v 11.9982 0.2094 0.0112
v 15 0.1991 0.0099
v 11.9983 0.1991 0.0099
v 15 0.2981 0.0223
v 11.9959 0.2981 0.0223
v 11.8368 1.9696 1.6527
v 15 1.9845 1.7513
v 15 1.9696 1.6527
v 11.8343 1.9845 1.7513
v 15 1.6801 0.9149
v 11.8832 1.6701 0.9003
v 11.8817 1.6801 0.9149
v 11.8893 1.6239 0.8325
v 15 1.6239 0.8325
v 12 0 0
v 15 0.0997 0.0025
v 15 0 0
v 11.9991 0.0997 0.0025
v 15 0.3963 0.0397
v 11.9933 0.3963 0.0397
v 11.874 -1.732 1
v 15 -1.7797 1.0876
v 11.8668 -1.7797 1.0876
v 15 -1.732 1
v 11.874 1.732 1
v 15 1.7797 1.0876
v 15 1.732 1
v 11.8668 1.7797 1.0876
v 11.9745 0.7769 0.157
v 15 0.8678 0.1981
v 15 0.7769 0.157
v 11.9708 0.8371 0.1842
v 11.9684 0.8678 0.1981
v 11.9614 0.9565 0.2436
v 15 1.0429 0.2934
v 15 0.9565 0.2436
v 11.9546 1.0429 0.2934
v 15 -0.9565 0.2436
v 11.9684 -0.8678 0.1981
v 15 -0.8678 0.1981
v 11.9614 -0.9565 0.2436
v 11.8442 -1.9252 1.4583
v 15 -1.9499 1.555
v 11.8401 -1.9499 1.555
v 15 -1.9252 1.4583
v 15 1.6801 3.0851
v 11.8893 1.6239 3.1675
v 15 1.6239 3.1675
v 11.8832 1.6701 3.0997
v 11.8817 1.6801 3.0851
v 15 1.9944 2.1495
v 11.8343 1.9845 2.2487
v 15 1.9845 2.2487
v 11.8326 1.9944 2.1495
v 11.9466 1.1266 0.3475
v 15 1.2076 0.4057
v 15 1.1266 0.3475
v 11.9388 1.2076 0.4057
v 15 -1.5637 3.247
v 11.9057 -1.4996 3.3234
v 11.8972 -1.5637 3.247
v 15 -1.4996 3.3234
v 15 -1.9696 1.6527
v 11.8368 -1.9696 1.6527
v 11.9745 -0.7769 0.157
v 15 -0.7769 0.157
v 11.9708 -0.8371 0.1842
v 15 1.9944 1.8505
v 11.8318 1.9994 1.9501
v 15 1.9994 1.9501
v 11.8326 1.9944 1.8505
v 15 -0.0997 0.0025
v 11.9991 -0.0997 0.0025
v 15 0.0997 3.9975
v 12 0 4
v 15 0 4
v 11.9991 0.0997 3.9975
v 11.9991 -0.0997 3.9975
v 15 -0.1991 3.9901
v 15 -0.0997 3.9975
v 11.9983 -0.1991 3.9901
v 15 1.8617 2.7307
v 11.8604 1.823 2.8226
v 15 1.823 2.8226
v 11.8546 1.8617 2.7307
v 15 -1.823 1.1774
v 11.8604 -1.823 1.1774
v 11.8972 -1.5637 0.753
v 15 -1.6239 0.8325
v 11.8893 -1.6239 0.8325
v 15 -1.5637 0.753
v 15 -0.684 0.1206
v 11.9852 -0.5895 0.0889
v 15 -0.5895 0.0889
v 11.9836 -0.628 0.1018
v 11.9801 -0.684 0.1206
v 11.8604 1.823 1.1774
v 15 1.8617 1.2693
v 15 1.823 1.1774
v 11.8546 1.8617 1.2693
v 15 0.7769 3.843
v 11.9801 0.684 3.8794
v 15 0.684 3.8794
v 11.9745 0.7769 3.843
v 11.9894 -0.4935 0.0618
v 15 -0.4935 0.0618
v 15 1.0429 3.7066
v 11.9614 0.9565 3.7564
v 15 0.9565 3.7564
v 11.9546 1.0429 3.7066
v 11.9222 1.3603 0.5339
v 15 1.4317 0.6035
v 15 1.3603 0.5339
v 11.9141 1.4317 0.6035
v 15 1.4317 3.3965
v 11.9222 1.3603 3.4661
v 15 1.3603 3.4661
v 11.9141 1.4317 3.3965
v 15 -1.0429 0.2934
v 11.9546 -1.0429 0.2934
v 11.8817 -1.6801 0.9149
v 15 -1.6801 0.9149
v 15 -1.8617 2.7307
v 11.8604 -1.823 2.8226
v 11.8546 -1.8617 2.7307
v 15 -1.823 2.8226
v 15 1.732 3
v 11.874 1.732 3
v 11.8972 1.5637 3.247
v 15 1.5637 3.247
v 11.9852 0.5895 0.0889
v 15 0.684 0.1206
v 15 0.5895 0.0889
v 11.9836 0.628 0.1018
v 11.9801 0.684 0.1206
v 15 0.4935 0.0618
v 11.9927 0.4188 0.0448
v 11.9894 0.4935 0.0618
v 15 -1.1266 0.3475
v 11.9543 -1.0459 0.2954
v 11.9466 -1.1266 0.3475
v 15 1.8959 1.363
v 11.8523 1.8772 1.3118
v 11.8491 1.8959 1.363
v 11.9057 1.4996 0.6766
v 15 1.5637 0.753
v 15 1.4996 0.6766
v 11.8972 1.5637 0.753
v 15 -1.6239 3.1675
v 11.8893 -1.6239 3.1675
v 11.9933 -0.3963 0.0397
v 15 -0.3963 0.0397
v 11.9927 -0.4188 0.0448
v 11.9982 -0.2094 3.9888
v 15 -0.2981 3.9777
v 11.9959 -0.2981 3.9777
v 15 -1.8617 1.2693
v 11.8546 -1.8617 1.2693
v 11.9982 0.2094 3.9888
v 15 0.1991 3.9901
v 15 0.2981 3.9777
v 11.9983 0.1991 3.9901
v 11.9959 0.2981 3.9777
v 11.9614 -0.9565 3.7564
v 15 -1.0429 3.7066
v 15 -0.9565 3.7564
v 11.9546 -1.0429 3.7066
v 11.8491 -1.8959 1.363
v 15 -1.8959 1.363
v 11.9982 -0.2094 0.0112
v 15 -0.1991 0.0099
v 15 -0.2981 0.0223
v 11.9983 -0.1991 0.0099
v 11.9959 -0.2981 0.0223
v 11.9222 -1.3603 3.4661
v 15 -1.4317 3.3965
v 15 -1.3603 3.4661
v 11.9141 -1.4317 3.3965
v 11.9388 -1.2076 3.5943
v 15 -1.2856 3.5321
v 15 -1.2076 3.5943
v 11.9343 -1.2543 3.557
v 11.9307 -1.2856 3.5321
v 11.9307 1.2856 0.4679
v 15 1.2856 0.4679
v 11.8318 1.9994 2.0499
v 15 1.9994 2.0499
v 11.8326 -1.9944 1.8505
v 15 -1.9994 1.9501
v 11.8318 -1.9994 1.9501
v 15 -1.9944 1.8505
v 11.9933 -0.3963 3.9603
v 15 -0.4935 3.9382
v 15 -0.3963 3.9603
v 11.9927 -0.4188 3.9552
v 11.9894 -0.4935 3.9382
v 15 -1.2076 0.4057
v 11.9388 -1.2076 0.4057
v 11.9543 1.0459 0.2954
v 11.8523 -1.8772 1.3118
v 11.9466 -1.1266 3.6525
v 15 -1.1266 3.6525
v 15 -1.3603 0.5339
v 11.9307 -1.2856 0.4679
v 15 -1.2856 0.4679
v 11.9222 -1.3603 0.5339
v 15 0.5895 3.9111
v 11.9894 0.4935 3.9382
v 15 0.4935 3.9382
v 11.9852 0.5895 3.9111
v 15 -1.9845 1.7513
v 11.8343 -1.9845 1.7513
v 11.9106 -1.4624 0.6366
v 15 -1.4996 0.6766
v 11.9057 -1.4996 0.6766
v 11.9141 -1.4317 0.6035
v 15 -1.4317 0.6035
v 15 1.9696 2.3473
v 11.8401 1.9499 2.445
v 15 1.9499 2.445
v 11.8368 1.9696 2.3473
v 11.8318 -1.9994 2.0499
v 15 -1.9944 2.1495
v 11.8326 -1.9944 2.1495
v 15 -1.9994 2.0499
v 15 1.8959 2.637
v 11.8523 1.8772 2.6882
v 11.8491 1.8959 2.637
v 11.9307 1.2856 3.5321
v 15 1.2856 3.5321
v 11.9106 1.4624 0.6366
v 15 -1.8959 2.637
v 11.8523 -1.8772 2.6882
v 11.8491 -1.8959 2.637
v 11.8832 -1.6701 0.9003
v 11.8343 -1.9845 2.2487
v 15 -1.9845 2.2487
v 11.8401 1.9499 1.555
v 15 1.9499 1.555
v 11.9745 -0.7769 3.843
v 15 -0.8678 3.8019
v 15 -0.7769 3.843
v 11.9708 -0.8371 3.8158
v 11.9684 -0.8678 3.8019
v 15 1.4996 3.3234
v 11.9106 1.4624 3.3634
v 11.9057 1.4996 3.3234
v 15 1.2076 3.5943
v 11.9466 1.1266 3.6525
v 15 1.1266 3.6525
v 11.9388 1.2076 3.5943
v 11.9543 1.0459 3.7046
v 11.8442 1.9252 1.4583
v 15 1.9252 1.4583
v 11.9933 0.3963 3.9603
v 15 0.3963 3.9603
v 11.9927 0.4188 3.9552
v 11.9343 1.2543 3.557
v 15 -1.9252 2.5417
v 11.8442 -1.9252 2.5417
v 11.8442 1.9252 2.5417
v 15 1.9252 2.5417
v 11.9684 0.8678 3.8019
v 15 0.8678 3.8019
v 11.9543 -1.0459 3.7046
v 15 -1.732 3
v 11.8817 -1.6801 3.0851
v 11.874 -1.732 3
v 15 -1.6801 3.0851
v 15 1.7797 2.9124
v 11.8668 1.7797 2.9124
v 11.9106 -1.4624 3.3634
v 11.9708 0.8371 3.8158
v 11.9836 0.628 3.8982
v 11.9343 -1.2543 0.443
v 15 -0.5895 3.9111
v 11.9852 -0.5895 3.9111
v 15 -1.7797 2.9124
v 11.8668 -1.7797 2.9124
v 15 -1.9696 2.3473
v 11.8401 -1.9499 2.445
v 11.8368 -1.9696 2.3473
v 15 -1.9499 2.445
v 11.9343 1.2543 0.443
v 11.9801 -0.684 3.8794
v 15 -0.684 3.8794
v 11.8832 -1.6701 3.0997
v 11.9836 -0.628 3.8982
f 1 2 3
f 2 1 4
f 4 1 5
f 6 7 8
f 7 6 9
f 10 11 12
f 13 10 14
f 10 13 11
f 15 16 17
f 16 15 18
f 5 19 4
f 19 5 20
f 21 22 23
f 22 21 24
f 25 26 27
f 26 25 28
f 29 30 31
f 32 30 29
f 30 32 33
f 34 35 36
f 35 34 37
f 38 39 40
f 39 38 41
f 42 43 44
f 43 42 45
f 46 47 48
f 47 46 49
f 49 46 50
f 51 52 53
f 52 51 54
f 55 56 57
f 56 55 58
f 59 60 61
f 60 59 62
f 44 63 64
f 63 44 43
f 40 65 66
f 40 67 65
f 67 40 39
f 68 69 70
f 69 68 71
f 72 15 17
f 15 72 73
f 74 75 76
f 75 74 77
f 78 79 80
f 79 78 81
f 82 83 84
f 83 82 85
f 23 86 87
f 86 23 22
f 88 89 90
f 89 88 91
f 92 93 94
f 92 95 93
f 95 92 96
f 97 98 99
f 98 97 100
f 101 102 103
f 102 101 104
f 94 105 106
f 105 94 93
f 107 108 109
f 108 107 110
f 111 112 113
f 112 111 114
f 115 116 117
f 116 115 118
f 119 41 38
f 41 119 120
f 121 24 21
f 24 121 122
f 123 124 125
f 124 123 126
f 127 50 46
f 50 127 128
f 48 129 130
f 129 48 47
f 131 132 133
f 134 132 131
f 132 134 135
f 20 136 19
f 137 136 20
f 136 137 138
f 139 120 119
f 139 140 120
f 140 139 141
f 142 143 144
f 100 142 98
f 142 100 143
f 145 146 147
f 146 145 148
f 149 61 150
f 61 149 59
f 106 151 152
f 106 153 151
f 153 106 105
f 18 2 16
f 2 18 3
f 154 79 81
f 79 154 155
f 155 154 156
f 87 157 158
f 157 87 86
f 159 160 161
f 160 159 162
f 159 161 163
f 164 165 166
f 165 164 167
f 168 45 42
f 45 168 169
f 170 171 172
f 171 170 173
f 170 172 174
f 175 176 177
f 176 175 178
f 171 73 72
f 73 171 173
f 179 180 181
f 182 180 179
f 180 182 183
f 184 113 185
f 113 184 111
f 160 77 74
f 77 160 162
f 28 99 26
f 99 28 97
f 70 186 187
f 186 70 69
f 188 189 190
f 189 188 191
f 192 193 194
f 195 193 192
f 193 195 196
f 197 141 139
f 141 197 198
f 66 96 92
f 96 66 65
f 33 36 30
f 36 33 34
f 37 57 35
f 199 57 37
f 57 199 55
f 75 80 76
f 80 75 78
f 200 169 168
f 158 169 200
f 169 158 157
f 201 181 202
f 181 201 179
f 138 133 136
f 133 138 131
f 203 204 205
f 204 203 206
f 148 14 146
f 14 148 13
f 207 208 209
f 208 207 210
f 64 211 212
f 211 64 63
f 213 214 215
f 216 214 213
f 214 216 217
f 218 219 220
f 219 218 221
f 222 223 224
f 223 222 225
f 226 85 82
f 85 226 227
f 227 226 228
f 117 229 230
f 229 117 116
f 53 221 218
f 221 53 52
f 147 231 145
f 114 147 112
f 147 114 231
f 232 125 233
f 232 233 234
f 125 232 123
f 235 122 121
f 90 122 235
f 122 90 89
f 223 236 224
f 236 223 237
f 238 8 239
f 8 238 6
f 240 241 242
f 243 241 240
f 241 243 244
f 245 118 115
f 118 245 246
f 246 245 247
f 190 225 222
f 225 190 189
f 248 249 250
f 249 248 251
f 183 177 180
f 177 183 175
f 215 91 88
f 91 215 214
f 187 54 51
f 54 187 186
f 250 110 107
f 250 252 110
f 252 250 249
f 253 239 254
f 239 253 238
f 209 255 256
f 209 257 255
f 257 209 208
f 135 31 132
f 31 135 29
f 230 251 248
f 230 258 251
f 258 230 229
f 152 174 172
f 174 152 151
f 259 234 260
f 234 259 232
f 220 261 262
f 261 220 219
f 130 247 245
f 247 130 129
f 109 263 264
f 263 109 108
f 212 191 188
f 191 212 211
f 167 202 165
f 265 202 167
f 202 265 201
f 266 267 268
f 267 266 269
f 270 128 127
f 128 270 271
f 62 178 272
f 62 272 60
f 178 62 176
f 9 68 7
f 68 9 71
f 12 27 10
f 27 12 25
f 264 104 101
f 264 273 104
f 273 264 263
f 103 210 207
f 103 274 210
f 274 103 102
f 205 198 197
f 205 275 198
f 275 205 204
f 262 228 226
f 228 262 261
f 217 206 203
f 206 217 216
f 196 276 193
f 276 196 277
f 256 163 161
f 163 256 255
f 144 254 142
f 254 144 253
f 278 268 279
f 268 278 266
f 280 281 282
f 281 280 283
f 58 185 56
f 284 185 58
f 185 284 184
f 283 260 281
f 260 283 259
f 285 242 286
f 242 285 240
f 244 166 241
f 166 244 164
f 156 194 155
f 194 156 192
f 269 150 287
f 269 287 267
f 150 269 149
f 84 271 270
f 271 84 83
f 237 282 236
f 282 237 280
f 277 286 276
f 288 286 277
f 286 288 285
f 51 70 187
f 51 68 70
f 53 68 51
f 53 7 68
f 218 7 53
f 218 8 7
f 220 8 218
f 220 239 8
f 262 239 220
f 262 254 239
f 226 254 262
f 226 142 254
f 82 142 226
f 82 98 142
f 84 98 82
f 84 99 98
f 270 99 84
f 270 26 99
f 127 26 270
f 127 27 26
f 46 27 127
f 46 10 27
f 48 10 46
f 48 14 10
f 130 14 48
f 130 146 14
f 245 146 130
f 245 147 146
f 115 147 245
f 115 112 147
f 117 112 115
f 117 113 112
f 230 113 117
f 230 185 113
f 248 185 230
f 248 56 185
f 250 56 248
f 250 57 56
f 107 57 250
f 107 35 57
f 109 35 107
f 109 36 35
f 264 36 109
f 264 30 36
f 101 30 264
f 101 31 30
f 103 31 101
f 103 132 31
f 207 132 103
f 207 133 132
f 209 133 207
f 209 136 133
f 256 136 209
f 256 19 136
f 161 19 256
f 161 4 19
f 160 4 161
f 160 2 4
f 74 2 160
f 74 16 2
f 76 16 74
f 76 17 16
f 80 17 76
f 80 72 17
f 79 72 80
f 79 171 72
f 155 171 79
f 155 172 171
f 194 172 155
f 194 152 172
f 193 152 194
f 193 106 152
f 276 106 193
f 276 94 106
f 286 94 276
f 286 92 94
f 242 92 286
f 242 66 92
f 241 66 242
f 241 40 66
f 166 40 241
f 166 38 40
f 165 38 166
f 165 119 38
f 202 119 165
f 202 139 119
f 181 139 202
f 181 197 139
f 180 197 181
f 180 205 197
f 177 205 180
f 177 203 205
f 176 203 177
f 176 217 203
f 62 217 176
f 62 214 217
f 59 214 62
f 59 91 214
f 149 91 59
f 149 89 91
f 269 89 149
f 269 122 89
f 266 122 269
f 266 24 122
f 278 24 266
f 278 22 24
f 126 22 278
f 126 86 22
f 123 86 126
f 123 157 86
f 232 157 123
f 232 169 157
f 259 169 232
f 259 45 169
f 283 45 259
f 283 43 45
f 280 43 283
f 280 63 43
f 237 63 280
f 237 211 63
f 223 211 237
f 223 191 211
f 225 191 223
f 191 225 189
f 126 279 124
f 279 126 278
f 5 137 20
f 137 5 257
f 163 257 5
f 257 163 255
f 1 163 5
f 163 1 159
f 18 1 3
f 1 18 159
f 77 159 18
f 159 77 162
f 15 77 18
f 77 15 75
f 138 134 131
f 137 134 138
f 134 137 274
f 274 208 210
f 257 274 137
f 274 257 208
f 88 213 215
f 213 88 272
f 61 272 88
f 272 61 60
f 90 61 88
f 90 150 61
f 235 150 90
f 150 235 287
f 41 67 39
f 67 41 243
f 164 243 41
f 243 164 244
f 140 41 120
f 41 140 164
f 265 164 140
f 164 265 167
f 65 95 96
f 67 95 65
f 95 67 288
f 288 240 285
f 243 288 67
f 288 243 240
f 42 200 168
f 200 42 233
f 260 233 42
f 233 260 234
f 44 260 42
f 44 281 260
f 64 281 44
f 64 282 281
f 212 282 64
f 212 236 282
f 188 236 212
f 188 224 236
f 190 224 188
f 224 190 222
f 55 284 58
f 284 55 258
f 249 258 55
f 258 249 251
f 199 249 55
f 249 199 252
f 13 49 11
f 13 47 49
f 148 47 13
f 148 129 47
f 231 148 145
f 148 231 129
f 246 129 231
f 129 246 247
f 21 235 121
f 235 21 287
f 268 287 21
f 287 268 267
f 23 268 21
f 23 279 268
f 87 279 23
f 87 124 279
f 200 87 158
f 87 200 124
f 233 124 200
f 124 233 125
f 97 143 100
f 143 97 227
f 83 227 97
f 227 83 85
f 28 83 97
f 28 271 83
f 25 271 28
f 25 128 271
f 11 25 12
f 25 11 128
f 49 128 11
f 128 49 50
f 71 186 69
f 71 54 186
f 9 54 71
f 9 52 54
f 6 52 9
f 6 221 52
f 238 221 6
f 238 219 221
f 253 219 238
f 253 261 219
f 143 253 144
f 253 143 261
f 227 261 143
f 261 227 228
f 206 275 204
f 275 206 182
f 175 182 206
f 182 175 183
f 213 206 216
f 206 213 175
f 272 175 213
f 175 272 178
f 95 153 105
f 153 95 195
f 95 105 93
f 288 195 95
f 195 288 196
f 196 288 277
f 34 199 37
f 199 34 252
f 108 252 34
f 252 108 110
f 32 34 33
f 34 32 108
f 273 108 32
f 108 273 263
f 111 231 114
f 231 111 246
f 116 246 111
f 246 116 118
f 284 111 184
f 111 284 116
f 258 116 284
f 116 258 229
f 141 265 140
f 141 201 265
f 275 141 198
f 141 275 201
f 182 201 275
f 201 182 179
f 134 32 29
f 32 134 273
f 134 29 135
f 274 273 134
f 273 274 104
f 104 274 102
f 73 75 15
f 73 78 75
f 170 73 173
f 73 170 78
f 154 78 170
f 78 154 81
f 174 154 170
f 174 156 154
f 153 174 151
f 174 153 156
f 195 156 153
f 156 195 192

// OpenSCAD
$fs=0.1;
$fa=1;

thickness_bottom=2;
radius_inner=10;
radius_outer=12;
height=30;
height_handle=15;
length_handle=5;
radius_handle=2;
radius_handle_corner=3;
module body_outer(){
    cylinder(height, radius_outer,radius_outer);
}

//handle connector bottom
module handle_bottom(){
difference(){
    
    translate([0,0,radius_handle]) 
    rotate([0,90,0])
    cylinder(length_handle-radius_handle+radius_outer,radius_handle,radius_handle);
    cylinder(height, radius_outer,radius_outer);
    
}
}
handle_bottom();
